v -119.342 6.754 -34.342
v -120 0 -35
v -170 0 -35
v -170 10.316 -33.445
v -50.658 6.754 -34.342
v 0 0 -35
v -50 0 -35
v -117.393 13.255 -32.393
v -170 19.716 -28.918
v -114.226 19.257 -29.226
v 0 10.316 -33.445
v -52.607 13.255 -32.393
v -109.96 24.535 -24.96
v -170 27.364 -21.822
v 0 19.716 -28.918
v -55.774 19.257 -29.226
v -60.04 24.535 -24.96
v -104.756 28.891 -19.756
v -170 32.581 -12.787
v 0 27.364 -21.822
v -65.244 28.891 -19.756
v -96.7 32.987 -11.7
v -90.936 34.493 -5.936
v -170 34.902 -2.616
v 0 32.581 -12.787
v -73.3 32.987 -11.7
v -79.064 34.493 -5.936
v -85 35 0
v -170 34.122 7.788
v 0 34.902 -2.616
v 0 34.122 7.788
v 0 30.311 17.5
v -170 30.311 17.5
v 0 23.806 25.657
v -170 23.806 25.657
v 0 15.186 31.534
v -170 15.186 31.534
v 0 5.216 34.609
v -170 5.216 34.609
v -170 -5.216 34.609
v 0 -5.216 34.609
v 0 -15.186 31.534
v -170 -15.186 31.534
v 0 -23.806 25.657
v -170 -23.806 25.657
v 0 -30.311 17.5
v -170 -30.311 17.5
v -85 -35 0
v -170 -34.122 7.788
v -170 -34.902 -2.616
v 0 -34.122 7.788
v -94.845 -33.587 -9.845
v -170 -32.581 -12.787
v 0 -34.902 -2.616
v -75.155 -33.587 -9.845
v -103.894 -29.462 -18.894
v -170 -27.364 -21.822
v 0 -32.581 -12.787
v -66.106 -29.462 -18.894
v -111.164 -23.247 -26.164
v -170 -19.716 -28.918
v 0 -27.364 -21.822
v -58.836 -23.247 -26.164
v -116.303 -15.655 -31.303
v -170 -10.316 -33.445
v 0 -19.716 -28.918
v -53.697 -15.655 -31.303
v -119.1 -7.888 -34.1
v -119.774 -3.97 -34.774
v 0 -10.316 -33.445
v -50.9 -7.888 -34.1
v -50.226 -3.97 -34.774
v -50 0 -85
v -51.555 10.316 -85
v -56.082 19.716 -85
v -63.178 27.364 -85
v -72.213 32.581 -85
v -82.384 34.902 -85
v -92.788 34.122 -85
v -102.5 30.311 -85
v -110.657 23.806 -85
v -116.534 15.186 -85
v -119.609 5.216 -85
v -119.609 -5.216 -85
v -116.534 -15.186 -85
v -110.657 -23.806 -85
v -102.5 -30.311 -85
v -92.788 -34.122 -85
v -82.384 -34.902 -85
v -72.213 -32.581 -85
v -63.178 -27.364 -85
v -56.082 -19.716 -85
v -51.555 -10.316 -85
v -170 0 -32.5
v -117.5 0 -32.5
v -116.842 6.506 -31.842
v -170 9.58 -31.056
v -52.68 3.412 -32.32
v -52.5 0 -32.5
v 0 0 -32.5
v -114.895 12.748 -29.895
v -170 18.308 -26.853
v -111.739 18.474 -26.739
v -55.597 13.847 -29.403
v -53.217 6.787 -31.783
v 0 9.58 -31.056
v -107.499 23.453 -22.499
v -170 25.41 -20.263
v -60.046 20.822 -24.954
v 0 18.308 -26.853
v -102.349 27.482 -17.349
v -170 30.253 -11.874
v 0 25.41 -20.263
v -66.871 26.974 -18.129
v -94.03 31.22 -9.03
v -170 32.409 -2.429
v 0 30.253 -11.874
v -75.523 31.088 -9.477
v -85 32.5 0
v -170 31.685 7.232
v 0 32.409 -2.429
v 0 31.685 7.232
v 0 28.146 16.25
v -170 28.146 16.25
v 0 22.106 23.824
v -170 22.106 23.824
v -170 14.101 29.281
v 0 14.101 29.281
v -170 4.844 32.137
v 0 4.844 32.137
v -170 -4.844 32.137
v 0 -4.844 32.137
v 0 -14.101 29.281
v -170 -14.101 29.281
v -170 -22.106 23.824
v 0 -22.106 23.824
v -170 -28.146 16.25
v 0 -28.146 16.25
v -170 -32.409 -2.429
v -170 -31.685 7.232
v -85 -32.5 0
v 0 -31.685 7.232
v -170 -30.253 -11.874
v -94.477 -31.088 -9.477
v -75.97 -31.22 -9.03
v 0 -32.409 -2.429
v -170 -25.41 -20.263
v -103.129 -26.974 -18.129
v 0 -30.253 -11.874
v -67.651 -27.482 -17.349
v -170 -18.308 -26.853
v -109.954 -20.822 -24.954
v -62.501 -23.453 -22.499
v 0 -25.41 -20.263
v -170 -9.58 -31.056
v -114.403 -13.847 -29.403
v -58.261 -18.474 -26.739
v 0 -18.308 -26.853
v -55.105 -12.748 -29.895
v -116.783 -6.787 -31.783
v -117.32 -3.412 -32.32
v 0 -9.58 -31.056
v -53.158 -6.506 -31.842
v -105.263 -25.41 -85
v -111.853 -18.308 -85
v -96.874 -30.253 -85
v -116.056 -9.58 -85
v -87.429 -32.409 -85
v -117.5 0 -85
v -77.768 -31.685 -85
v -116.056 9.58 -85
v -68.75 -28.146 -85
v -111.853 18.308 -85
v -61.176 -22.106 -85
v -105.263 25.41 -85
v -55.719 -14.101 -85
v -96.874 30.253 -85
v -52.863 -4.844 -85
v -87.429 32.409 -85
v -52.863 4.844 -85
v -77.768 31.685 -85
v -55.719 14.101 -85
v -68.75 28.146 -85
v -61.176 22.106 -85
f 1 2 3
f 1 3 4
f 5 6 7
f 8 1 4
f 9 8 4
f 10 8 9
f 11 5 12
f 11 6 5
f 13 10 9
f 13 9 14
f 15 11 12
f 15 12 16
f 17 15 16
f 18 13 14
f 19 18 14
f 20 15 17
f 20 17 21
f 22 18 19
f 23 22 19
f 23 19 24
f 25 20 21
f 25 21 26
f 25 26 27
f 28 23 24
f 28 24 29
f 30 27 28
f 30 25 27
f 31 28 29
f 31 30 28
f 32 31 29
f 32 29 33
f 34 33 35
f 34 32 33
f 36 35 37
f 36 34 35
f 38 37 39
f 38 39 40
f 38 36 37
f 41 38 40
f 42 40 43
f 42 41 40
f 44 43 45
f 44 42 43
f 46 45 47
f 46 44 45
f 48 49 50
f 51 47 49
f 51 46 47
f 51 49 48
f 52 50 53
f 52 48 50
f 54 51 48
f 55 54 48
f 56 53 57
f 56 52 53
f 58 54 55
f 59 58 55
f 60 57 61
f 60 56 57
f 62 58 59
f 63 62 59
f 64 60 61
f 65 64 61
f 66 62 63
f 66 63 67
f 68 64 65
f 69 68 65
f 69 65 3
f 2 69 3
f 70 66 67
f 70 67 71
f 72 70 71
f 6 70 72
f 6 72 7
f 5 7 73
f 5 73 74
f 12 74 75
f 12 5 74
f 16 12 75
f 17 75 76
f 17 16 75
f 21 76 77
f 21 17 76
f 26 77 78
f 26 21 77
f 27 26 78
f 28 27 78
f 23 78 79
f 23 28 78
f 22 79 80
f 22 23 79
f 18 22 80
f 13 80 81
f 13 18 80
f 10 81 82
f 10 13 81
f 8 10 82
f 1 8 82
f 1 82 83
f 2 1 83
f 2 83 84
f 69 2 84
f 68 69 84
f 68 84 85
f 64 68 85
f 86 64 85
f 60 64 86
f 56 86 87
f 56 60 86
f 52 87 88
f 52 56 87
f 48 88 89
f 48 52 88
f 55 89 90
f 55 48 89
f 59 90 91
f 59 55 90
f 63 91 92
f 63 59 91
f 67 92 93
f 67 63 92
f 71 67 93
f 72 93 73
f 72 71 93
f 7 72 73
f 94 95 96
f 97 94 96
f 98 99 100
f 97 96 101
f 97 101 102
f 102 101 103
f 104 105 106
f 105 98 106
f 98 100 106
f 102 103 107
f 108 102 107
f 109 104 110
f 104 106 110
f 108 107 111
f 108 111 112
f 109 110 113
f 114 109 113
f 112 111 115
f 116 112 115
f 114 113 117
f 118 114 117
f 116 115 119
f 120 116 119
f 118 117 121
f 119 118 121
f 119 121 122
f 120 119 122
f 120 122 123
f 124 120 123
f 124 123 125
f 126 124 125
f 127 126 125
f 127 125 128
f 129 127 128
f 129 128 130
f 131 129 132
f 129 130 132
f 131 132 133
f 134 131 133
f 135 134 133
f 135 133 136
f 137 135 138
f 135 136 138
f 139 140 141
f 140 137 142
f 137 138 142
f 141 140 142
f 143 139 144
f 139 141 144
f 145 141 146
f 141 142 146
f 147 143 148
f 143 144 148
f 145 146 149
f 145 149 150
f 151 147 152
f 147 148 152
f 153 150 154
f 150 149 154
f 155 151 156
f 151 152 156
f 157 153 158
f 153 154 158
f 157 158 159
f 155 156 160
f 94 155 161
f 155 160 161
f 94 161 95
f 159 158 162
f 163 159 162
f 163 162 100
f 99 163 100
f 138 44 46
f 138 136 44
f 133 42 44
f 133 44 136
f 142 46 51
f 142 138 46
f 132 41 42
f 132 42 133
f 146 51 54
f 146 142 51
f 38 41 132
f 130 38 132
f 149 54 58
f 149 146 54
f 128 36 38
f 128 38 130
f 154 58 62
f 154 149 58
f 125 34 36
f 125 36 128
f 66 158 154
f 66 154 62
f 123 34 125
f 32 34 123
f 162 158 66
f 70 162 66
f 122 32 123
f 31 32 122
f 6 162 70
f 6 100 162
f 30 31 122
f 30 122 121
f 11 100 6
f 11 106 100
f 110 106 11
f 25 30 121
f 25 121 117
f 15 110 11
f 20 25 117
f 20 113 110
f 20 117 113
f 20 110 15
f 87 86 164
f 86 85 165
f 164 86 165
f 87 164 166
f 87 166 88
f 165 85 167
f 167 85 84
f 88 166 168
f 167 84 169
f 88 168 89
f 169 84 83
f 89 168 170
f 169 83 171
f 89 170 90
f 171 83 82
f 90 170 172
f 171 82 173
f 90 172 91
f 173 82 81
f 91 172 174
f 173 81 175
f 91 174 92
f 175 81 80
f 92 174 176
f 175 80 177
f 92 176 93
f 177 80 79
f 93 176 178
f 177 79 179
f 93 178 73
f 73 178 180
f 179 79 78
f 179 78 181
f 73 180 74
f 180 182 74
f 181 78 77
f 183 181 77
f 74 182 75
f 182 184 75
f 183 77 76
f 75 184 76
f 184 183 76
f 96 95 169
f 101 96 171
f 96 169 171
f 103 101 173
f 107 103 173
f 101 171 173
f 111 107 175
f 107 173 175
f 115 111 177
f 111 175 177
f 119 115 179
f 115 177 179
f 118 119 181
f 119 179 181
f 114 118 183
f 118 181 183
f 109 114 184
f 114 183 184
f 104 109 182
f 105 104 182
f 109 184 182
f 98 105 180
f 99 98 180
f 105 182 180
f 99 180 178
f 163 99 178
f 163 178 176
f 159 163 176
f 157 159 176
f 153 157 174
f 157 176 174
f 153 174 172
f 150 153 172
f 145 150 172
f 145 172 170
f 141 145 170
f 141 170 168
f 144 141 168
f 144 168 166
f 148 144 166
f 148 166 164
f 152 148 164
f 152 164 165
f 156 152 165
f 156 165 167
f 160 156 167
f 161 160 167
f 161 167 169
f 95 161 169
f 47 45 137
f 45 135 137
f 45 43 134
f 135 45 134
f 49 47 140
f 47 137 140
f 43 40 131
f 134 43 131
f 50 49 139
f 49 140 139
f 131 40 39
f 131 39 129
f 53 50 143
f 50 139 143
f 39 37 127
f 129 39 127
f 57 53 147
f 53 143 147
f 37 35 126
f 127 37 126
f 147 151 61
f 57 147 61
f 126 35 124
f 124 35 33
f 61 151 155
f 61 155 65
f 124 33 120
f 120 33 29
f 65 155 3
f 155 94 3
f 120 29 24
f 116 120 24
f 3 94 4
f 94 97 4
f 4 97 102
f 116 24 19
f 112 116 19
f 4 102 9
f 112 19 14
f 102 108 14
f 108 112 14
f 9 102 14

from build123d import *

# Parameters (mm, degrees)
SKETCH1_R           = 35
BOSS_EXTRUDE1_DEPTH = 170
SKETCH4_R           = 35
BOSS_EXTRUDE2_DEPTH = 85
SKETCH5_R           = 32.5
CUT_EXTRUDE2_DEPTH  = 85
SKETCH2_R           = 32.5
CUT_EXTRUDE3_DEPTH  = 194.261480901


with BuildPart() as part:
    # Sketch1 → Boss-Extrude1 (new body)
    with BuildSketch(Plane(origin=(0, 0, 0), x_dir=(0, 0, -1), z_dir=(1, 0, 0))):
        Circle(SKETCH1_R)
    extrude(amount=-BOSS_EXTRUDE1_DEPTH)

    # Sketch4 → Boss-Extrude2 (add)
    with BuildSketch(Plane.XY):
        with Locations((-85, 0)):
            Circle(SKETCH4_R)
    extrude(amount=-BOSS_EXTRUDE2_DEPTH)

    # Sketch5 → Cut-Extrude2 (cut)
    with BuildSketch(Plane(origin=(0, 0, -85), x_dir=(-1, 0, 0), z_dir=(0, 0, -1))):
        with Locations((85, 0)):
            Circle(SKETCH5_R)
    extrude(amount=-CUT_EXTRUDE2_DEPTH, mode=Mode.SUBTRACT)

    # Sketch2 → Cut-Extrude3 (cut, through all)
    with BuildSketch(Plane(origin=(0, 0, 0), x_dir=(0, 0, -1), z_dir=(1, 0, 0))):
        Circle(SKETCH2_R)
    extrude(amount=-CUT_EXTRUDE3_DEPTH, mode=Mode.SUBTRACT)


solid = part.part
